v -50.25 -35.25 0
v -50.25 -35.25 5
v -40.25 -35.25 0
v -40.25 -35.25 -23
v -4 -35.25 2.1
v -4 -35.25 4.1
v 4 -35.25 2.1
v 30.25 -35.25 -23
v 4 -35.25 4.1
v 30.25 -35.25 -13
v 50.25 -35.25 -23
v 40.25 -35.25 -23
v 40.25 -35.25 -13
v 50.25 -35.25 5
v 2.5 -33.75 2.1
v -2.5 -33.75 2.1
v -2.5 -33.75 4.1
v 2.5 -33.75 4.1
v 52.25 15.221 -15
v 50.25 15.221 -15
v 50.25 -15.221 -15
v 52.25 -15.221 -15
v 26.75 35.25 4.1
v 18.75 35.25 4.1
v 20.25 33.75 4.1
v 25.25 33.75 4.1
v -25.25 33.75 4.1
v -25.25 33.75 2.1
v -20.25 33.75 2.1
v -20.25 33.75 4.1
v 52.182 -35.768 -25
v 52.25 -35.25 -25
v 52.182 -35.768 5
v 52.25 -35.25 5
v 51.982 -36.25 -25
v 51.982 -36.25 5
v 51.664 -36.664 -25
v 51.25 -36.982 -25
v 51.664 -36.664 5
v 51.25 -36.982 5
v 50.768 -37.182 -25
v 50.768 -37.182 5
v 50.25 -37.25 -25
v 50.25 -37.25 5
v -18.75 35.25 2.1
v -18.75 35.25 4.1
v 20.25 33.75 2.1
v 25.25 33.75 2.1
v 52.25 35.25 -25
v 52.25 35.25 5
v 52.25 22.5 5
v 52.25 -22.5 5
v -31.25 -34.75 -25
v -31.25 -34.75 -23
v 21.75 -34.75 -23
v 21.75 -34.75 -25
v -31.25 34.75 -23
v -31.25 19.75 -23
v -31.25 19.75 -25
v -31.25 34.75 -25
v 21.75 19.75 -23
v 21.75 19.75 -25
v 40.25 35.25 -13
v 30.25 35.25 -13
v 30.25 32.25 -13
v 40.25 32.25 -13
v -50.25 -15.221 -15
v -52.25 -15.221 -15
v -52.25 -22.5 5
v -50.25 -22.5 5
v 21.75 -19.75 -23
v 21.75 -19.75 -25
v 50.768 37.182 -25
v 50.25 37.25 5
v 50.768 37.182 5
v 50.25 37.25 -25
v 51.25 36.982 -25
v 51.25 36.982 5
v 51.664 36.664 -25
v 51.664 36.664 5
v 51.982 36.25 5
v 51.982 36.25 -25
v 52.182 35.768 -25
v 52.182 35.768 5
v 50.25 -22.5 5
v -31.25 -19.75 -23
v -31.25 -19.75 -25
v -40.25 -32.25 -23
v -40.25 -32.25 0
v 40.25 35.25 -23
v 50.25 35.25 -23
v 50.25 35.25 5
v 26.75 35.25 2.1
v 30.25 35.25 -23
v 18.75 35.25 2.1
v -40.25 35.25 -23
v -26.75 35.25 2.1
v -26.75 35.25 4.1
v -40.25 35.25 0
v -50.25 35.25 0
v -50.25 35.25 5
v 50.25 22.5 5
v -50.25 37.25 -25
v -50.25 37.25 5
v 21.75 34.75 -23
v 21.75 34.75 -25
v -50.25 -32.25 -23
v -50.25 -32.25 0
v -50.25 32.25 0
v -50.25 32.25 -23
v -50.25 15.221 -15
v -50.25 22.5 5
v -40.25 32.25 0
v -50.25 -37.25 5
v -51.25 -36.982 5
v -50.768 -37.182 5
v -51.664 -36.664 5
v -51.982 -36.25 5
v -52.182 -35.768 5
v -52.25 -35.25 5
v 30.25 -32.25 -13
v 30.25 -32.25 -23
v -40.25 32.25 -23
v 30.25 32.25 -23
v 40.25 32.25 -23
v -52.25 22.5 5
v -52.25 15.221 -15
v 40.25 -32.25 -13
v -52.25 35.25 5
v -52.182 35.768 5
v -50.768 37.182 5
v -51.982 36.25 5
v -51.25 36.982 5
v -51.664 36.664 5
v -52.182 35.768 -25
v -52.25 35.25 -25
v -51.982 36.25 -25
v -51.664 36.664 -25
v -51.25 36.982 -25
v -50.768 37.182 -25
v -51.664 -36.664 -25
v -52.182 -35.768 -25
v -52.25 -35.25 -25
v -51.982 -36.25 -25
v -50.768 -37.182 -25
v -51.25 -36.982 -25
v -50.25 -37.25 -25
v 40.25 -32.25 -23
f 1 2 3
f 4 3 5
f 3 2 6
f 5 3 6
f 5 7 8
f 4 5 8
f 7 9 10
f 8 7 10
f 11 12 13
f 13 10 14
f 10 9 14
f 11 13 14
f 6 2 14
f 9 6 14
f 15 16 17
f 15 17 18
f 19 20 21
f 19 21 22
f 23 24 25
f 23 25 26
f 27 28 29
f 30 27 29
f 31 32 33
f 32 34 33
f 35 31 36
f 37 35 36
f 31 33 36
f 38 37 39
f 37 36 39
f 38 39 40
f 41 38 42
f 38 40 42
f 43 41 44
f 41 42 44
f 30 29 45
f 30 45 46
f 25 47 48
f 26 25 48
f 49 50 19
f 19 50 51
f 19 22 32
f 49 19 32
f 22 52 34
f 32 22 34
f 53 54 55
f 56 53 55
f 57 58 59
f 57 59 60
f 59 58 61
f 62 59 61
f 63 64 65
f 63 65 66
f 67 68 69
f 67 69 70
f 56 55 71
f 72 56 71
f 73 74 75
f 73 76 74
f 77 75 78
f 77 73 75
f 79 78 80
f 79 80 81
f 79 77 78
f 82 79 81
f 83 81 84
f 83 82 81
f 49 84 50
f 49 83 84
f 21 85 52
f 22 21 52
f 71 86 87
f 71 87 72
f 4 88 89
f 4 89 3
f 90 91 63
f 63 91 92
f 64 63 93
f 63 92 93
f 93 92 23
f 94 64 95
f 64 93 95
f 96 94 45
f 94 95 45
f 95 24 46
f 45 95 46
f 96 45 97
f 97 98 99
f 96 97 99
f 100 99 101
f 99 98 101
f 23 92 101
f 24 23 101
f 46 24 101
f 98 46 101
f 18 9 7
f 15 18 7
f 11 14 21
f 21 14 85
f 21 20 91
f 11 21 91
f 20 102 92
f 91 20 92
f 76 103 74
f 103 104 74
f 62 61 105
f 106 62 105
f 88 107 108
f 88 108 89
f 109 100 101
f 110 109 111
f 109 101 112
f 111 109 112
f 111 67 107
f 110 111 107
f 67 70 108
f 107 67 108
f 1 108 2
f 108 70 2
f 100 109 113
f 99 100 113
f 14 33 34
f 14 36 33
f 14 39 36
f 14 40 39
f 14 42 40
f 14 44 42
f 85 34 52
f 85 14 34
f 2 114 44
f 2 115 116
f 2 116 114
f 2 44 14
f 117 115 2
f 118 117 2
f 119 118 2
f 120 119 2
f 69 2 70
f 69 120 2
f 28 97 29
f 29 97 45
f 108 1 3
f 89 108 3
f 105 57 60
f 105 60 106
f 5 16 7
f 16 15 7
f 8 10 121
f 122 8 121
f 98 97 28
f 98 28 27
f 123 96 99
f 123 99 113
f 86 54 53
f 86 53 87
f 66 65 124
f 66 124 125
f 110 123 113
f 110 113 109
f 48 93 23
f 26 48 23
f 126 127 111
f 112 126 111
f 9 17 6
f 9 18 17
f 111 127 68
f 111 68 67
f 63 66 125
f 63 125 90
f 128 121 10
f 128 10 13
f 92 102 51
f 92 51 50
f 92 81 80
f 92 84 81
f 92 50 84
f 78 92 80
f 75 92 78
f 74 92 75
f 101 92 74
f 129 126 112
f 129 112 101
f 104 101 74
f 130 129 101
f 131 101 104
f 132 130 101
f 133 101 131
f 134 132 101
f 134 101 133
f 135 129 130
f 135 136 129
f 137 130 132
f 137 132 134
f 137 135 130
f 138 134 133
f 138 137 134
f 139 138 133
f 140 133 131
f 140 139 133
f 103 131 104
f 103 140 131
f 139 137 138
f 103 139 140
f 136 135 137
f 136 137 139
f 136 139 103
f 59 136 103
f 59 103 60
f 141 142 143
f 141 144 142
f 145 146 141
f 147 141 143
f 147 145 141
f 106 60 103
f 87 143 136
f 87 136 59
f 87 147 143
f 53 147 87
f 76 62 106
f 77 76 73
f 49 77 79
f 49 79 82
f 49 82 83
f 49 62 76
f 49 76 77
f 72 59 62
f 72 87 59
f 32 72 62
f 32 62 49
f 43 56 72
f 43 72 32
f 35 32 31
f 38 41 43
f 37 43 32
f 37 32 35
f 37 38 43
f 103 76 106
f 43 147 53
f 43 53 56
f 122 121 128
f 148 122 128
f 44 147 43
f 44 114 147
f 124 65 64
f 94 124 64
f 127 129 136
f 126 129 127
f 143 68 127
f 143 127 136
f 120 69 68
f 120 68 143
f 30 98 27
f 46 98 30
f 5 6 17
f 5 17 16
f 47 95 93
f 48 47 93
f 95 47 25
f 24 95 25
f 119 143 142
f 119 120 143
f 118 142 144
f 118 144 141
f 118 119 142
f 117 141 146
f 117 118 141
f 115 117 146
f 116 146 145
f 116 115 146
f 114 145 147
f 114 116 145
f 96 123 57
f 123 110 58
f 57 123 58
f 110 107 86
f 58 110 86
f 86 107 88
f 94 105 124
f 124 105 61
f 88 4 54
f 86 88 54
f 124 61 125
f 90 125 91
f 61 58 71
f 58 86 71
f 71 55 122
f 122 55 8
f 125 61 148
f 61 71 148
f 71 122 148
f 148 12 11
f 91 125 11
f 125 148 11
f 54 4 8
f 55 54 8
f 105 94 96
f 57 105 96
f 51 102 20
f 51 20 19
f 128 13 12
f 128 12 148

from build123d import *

# Parameters (mm, degrees)
SKETCH1_W                               = 74.5
SKETCH1_H                               = 104.5
SKETCH1_W_2                             = 70.5
SKETCH1_H_2                             = 100.5
BOSS_EXTRUDE1_ABOVE_BOARD_SURFACE_DEPTH = 5
SKETCH2_W                               = 104.5
SKETCH2_H                               = 74.5
BOSS_EXTRUDE2_UNDER_23MM_DEPTH          = 23
SKETCH3_W                               = 104.5
SKETCH3_H                               = 74.5
BOSS_EXTRUDE3_BOTTOM_COVER_2MM_DEPTH    = 2
SKETCH4_W                               = 5
SKETCH4_H                               = 3.5
BOSS_EXTRUDE4_ANCHOR_PINS_DEPTH         = 2
SKETCH5_W                               = 150
SKETCH5_H                               = 45
CUT_EXTRUDE1_CUT_USB_DEPTH              = 20
CUT_EXTRUDE1_CUT_USB_DRAFT              = -20
FILLET1_R                               = 2
CHAMFER2_SIZE                           = 1.5
SKETCH6_W                               = 10
SKETCH6_H                               = 3
BOSS_EXTRUDE1_DEPTH                     = 10
SKETCH7_W                               = 53
SKETCH7_H                               = 15
CUT_EXTRUDE1_DEPTH                      = 10


with BuildPart() as part:
    # Sketch1 → Boss-Extrude1-above-board-surface (new body)
    with BuildSketch(Plane(origin=(0, 0, 0), x_dir=(0, 1, 0), z_dir=(0, 0, 1))):
        Rectangle(SKETCH1_W, SKETCH1_H)
        Rectangle(SKETCH1_W_2, SKETCH1_H_2, mode=Mode.SUBTRACT)
    extrude(amount=BOSS_EXTRUDE1_ABOVE_BOARD_SURFACE_DEPTH)

    # Sketch2 → Boss-Extrude2-under-23mm (add)
    with BuildSketch(Plane(origin=(0, 0, 0), x_dir=(1, 0, 0), z_dir=(0, 0, -1))):
        Rectangle(SKETCH2_W, SKETCH2_H)
        Polygon((-50.25, 32.25), (-40.25, 32.25), (-40.25, 35.25), (50.25, 35.25), (50.25, -35.25), (-40.25, -35.25), (-40.25, -32.25), (-50.25, -32.25), align=None, mode=Mode.SUBTRACT)
    extrude(amount=BOSS_EXTRUDE2_UNDER_23MM_DEPTH)

    # Sketch3 → Boss-Extrude3-bottom-cover-2mm (add)
    with BuildSketch(Plane(origin=(0, 0, -23), x_dir=(1, 0, 0), z_dir=(0, 0, -1))):
        Rectangle(SKETCH3_W, SKETCH3_H)
    extrude(amount=BOSS_EXTRUDE3_BOTTOM_COVER_2MM_DEPTH)

    # Sketch4 → Boss-Extrude4-anchor-pins (add)
    with BuildSketch(Plane.XY.offset(2.1)):
        with Locations((-22.75, 35.5)):
            Rectangle(SKETCH4_W, SKETCH4_H)
        with Locations((22.75, 35.5)):
            Rectangle(SKETCH4_W, SKETCH4_H)
        with Locations((0, -35.5)):
            Rectangle(SKETCH4_W, SKETCH4_H)
    extrude(amount=BOSS_EXTRUDE4_ANCHOR_PINS_DEPTH)


with BuildPart() as cut_extrude1_cut_usb_tool:
    # Sketch5 → Cut-Extrude1-cut-usb (with draft: the straight prism first)
    with BuildSketch(Plane.XY.offset(5)):
        Rectangle(SKETCH5_W, SKETCH5_H)
    extrude(amount=-CUT_EXTRUDE1_CUT_USB_DEPTH)
    # Cut-Extrude1-cut-usb: the draft: its side faces are tilted about the plane it starts from
    cut_extrude1_cut_usb_sides = [cut_extrude1_cut_usb_tool.faces().sort_by_distance(p)[0] for p in [
        (0, -22.5, -5),
        (75, 0, -5),
        (0, 22.5, -5),
        (-75, 0, -5),
    ]]
    draft(cut_extrude1_cut_usb_sides, Plane.XY.offset(5), CUT_EXTRUDE1_CUT_USB_DRAFT)


with BuildPart() as part_1:
    add(part.part)

    # Cut-Extrude1-cut-usb: cut by cut_extrude1_cut_usb_tool
    add(cut_extrude1_cut_usb_tool.part, mode=Mode.SUBTRACT)

    # Fillet1
    fillet1_edges = [part_1.edges().sort_by_distance(p)[0] for p in [
        (52.25, -37.25, -10),
        (-52.25, -37.25, -10),
        (-52.25, 37.25, -10),
        (52.25, 37.25, -10),
    ]]
    fillet(fillet1_edges, radius=FILLET1_R)

    # Chamfer2
    chamfer2_edges = [part_1.edges().sort_by_distance(p)[0] for p in [
        (20.25, 35.25, 3.1),
        (25.25, 35.25, 3.1),
        (-25.25, 35.25, 3.1),
        (-20.25, 35.25, 3.1),
        (2.5, -35.25, 3.1),
        (-2.5, -35.25, 3.1),
    ]]
    chamfer(chamfer2_edges, length=CHAMFER2_SIZE - 0.0001)  # a hair under: the kernel refuses the full size

    # Sketch6 → Boss-Extrude1 (add)
    with BuildSketch(Plane.XY.offset(-13)):
        with Locations((35.25, -33.75)):
            Rectangle(SKETCH6_W, SKETCH6_H)
        with Locations((35.25, 33.75)):
            Rectangle(SKETCH6_W, SKETCH6_H)
    extrude(amount=-BOSS_EXTRUDE1_DEPTH)

    # Sketch7 → Cut-Extrude1 (cut)
    with BuildSketch(Plane.XY.offset(-23)):
        with Locations((-4.75, 27.25)):
            Rectangle(SKETCH7_W, SKETCH7_H)
        with Locations((-4.75, -27.25)):
            Rectangle(SKETCH7_W, SKETCH7_H)
    extrude(amount=-CUT_EXTRUDE1_DEPTH, mode=Mode.SUBTRACT)


solid = part_1.part
